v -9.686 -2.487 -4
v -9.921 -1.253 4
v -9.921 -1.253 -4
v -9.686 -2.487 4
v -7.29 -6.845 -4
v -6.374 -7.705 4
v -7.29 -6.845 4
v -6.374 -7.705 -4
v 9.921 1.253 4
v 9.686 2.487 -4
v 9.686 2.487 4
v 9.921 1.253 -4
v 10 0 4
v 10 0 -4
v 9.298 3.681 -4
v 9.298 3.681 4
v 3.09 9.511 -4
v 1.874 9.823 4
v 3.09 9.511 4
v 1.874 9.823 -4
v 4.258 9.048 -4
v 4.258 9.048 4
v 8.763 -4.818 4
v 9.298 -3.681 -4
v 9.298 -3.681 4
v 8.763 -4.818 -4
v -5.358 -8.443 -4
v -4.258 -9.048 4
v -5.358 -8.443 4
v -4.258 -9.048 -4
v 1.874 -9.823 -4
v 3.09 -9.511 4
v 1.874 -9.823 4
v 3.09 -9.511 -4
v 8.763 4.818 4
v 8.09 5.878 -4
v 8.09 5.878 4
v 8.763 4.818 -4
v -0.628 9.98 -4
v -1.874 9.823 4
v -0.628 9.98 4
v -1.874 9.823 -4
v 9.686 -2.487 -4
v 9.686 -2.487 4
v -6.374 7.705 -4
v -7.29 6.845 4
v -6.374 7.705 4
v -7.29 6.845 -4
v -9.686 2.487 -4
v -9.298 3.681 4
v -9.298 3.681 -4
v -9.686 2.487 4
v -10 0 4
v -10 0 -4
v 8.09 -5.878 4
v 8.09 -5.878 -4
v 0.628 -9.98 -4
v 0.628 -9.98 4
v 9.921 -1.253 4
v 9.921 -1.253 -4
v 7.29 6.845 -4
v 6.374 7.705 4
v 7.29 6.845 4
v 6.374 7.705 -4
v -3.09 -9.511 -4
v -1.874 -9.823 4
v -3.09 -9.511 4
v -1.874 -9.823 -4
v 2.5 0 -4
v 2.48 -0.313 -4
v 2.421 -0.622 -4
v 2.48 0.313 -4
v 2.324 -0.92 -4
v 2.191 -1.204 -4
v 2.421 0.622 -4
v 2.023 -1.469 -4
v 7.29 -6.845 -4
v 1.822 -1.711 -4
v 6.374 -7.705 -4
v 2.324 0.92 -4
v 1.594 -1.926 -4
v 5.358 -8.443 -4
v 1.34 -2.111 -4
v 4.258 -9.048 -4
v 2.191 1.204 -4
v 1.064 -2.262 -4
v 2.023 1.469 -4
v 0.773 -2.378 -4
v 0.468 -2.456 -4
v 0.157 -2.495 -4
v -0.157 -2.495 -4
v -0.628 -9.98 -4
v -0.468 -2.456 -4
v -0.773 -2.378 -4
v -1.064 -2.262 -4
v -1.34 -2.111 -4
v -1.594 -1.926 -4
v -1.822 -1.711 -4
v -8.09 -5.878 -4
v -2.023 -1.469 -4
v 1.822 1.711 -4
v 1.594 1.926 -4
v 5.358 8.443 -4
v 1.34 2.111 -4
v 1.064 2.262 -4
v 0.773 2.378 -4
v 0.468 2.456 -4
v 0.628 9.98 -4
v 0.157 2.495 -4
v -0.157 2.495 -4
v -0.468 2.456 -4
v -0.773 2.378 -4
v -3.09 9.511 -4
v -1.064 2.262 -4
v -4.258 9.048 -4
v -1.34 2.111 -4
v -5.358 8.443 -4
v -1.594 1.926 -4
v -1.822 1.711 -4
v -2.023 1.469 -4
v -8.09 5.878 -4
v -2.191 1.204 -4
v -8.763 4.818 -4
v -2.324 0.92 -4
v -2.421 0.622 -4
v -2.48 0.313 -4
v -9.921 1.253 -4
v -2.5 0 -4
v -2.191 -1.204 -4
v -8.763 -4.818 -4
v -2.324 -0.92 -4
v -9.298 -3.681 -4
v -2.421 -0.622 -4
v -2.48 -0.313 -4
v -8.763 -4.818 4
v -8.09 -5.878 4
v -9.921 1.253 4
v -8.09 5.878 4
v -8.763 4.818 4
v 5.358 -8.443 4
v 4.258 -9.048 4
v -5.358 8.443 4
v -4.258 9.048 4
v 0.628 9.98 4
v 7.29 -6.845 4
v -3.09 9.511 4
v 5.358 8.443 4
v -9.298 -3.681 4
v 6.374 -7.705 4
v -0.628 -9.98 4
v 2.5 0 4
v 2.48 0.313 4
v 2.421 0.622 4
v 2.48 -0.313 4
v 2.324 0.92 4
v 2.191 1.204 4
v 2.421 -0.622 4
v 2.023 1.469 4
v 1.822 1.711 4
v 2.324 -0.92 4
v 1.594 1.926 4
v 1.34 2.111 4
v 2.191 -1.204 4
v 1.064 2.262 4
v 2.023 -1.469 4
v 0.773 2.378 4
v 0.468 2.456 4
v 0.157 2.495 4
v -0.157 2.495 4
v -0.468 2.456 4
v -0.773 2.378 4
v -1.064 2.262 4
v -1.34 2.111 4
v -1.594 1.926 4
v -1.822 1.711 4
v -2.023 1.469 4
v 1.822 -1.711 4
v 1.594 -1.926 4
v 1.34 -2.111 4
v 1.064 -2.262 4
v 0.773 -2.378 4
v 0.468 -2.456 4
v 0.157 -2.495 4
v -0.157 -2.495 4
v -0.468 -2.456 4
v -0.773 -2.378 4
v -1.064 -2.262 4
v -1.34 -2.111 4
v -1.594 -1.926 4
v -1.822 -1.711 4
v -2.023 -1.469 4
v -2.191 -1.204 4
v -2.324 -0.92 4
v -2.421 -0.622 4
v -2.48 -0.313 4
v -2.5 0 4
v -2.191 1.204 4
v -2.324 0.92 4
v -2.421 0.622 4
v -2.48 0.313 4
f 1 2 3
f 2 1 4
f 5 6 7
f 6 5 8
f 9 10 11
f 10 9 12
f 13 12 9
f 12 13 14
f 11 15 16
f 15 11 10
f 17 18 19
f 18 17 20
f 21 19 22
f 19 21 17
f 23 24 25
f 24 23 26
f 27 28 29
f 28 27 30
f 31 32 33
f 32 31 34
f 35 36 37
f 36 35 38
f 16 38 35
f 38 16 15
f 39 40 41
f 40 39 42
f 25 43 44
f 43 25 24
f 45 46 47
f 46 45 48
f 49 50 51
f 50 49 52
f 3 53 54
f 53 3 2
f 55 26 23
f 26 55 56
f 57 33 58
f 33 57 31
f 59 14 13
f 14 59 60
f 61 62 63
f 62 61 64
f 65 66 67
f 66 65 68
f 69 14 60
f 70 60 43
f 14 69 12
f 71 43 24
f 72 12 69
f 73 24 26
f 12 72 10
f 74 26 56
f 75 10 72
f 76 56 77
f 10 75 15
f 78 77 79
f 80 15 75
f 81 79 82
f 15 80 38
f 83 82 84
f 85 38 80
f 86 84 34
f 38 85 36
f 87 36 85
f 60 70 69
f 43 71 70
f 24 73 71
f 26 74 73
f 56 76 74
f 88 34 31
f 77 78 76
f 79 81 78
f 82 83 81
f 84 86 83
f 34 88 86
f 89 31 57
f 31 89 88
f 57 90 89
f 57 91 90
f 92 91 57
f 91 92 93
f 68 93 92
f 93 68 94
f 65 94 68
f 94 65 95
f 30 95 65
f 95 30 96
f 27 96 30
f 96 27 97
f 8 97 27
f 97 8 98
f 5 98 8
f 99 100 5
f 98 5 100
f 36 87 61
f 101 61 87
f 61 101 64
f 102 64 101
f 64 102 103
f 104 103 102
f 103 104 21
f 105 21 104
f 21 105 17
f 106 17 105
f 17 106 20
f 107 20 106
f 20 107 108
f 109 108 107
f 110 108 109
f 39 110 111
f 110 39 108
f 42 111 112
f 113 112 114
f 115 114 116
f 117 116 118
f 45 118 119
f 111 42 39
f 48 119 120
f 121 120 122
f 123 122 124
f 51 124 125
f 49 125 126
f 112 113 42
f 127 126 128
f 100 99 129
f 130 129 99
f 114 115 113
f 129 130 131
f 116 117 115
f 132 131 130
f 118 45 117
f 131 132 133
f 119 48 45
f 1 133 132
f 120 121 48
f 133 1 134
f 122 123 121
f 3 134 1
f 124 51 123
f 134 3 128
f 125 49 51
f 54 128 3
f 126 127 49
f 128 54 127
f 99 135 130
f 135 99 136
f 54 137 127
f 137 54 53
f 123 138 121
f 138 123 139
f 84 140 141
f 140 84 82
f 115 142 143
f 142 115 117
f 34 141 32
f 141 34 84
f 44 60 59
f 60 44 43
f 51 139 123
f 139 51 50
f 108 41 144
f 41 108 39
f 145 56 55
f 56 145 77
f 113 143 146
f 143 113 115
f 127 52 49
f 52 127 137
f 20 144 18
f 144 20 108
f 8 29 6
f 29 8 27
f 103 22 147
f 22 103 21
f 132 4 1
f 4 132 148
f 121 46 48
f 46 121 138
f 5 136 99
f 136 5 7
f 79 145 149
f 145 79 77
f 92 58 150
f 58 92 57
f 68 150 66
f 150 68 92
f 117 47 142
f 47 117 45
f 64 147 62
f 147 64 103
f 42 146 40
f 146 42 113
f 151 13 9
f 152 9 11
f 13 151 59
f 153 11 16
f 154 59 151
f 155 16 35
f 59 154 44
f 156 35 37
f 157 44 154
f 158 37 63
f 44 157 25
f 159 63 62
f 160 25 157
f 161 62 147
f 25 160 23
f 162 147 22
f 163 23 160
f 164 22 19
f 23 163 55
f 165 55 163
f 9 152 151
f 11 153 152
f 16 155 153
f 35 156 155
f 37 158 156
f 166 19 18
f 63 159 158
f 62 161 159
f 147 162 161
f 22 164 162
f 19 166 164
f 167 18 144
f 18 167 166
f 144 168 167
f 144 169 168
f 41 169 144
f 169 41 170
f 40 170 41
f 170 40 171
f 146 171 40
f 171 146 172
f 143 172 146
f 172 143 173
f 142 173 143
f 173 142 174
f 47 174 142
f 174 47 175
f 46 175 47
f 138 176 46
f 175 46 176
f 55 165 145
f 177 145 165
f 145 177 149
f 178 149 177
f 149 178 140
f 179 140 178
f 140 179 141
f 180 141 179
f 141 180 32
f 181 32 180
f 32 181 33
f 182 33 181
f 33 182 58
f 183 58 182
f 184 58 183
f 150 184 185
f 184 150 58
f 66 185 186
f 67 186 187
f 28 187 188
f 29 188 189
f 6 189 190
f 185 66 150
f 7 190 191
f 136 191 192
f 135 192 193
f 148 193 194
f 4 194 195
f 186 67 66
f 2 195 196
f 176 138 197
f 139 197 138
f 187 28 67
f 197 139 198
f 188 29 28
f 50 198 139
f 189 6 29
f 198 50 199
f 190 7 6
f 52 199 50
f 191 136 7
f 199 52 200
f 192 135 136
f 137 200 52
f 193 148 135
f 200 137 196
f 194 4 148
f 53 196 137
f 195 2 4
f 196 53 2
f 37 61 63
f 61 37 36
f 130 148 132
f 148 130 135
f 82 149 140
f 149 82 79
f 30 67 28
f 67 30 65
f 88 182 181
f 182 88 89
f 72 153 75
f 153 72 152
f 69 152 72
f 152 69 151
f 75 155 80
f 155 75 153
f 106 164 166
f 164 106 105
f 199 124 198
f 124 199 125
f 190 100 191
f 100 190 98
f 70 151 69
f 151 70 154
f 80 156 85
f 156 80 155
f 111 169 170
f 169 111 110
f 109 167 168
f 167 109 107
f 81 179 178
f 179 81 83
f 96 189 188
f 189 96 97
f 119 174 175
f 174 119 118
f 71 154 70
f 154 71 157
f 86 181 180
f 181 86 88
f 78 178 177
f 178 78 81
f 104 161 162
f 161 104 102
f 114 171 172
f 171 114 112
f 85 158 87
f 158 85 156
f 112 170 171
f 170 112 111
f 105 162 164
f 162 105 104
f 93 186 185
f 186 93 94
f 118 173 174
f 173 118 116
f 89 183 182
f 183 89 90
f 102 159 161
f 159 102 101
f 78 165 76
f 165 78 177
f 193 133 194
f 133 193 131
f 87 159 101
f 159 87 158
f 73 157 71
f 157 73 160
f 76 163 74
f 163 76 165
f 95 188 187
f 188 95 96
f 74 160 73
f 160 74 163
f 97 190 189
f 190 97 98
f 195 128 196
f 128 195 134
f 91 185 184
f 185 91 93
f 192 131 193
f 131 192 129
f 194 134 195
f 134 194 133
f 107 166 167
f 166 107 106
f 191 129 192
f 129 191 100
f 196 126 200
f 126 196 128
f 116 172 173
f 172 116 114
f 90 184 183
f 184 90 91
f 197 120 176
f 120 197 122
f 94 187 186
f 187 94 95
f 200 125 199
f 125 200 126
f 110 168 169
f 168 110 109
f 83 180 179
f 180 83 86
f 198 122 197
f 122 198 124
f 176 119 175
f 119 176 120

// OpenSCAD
$fn=50;
difference() {
	cylinder(h=8, d=20, center=true);
	cylinder(h=8.5, d=5, center=true);
}
